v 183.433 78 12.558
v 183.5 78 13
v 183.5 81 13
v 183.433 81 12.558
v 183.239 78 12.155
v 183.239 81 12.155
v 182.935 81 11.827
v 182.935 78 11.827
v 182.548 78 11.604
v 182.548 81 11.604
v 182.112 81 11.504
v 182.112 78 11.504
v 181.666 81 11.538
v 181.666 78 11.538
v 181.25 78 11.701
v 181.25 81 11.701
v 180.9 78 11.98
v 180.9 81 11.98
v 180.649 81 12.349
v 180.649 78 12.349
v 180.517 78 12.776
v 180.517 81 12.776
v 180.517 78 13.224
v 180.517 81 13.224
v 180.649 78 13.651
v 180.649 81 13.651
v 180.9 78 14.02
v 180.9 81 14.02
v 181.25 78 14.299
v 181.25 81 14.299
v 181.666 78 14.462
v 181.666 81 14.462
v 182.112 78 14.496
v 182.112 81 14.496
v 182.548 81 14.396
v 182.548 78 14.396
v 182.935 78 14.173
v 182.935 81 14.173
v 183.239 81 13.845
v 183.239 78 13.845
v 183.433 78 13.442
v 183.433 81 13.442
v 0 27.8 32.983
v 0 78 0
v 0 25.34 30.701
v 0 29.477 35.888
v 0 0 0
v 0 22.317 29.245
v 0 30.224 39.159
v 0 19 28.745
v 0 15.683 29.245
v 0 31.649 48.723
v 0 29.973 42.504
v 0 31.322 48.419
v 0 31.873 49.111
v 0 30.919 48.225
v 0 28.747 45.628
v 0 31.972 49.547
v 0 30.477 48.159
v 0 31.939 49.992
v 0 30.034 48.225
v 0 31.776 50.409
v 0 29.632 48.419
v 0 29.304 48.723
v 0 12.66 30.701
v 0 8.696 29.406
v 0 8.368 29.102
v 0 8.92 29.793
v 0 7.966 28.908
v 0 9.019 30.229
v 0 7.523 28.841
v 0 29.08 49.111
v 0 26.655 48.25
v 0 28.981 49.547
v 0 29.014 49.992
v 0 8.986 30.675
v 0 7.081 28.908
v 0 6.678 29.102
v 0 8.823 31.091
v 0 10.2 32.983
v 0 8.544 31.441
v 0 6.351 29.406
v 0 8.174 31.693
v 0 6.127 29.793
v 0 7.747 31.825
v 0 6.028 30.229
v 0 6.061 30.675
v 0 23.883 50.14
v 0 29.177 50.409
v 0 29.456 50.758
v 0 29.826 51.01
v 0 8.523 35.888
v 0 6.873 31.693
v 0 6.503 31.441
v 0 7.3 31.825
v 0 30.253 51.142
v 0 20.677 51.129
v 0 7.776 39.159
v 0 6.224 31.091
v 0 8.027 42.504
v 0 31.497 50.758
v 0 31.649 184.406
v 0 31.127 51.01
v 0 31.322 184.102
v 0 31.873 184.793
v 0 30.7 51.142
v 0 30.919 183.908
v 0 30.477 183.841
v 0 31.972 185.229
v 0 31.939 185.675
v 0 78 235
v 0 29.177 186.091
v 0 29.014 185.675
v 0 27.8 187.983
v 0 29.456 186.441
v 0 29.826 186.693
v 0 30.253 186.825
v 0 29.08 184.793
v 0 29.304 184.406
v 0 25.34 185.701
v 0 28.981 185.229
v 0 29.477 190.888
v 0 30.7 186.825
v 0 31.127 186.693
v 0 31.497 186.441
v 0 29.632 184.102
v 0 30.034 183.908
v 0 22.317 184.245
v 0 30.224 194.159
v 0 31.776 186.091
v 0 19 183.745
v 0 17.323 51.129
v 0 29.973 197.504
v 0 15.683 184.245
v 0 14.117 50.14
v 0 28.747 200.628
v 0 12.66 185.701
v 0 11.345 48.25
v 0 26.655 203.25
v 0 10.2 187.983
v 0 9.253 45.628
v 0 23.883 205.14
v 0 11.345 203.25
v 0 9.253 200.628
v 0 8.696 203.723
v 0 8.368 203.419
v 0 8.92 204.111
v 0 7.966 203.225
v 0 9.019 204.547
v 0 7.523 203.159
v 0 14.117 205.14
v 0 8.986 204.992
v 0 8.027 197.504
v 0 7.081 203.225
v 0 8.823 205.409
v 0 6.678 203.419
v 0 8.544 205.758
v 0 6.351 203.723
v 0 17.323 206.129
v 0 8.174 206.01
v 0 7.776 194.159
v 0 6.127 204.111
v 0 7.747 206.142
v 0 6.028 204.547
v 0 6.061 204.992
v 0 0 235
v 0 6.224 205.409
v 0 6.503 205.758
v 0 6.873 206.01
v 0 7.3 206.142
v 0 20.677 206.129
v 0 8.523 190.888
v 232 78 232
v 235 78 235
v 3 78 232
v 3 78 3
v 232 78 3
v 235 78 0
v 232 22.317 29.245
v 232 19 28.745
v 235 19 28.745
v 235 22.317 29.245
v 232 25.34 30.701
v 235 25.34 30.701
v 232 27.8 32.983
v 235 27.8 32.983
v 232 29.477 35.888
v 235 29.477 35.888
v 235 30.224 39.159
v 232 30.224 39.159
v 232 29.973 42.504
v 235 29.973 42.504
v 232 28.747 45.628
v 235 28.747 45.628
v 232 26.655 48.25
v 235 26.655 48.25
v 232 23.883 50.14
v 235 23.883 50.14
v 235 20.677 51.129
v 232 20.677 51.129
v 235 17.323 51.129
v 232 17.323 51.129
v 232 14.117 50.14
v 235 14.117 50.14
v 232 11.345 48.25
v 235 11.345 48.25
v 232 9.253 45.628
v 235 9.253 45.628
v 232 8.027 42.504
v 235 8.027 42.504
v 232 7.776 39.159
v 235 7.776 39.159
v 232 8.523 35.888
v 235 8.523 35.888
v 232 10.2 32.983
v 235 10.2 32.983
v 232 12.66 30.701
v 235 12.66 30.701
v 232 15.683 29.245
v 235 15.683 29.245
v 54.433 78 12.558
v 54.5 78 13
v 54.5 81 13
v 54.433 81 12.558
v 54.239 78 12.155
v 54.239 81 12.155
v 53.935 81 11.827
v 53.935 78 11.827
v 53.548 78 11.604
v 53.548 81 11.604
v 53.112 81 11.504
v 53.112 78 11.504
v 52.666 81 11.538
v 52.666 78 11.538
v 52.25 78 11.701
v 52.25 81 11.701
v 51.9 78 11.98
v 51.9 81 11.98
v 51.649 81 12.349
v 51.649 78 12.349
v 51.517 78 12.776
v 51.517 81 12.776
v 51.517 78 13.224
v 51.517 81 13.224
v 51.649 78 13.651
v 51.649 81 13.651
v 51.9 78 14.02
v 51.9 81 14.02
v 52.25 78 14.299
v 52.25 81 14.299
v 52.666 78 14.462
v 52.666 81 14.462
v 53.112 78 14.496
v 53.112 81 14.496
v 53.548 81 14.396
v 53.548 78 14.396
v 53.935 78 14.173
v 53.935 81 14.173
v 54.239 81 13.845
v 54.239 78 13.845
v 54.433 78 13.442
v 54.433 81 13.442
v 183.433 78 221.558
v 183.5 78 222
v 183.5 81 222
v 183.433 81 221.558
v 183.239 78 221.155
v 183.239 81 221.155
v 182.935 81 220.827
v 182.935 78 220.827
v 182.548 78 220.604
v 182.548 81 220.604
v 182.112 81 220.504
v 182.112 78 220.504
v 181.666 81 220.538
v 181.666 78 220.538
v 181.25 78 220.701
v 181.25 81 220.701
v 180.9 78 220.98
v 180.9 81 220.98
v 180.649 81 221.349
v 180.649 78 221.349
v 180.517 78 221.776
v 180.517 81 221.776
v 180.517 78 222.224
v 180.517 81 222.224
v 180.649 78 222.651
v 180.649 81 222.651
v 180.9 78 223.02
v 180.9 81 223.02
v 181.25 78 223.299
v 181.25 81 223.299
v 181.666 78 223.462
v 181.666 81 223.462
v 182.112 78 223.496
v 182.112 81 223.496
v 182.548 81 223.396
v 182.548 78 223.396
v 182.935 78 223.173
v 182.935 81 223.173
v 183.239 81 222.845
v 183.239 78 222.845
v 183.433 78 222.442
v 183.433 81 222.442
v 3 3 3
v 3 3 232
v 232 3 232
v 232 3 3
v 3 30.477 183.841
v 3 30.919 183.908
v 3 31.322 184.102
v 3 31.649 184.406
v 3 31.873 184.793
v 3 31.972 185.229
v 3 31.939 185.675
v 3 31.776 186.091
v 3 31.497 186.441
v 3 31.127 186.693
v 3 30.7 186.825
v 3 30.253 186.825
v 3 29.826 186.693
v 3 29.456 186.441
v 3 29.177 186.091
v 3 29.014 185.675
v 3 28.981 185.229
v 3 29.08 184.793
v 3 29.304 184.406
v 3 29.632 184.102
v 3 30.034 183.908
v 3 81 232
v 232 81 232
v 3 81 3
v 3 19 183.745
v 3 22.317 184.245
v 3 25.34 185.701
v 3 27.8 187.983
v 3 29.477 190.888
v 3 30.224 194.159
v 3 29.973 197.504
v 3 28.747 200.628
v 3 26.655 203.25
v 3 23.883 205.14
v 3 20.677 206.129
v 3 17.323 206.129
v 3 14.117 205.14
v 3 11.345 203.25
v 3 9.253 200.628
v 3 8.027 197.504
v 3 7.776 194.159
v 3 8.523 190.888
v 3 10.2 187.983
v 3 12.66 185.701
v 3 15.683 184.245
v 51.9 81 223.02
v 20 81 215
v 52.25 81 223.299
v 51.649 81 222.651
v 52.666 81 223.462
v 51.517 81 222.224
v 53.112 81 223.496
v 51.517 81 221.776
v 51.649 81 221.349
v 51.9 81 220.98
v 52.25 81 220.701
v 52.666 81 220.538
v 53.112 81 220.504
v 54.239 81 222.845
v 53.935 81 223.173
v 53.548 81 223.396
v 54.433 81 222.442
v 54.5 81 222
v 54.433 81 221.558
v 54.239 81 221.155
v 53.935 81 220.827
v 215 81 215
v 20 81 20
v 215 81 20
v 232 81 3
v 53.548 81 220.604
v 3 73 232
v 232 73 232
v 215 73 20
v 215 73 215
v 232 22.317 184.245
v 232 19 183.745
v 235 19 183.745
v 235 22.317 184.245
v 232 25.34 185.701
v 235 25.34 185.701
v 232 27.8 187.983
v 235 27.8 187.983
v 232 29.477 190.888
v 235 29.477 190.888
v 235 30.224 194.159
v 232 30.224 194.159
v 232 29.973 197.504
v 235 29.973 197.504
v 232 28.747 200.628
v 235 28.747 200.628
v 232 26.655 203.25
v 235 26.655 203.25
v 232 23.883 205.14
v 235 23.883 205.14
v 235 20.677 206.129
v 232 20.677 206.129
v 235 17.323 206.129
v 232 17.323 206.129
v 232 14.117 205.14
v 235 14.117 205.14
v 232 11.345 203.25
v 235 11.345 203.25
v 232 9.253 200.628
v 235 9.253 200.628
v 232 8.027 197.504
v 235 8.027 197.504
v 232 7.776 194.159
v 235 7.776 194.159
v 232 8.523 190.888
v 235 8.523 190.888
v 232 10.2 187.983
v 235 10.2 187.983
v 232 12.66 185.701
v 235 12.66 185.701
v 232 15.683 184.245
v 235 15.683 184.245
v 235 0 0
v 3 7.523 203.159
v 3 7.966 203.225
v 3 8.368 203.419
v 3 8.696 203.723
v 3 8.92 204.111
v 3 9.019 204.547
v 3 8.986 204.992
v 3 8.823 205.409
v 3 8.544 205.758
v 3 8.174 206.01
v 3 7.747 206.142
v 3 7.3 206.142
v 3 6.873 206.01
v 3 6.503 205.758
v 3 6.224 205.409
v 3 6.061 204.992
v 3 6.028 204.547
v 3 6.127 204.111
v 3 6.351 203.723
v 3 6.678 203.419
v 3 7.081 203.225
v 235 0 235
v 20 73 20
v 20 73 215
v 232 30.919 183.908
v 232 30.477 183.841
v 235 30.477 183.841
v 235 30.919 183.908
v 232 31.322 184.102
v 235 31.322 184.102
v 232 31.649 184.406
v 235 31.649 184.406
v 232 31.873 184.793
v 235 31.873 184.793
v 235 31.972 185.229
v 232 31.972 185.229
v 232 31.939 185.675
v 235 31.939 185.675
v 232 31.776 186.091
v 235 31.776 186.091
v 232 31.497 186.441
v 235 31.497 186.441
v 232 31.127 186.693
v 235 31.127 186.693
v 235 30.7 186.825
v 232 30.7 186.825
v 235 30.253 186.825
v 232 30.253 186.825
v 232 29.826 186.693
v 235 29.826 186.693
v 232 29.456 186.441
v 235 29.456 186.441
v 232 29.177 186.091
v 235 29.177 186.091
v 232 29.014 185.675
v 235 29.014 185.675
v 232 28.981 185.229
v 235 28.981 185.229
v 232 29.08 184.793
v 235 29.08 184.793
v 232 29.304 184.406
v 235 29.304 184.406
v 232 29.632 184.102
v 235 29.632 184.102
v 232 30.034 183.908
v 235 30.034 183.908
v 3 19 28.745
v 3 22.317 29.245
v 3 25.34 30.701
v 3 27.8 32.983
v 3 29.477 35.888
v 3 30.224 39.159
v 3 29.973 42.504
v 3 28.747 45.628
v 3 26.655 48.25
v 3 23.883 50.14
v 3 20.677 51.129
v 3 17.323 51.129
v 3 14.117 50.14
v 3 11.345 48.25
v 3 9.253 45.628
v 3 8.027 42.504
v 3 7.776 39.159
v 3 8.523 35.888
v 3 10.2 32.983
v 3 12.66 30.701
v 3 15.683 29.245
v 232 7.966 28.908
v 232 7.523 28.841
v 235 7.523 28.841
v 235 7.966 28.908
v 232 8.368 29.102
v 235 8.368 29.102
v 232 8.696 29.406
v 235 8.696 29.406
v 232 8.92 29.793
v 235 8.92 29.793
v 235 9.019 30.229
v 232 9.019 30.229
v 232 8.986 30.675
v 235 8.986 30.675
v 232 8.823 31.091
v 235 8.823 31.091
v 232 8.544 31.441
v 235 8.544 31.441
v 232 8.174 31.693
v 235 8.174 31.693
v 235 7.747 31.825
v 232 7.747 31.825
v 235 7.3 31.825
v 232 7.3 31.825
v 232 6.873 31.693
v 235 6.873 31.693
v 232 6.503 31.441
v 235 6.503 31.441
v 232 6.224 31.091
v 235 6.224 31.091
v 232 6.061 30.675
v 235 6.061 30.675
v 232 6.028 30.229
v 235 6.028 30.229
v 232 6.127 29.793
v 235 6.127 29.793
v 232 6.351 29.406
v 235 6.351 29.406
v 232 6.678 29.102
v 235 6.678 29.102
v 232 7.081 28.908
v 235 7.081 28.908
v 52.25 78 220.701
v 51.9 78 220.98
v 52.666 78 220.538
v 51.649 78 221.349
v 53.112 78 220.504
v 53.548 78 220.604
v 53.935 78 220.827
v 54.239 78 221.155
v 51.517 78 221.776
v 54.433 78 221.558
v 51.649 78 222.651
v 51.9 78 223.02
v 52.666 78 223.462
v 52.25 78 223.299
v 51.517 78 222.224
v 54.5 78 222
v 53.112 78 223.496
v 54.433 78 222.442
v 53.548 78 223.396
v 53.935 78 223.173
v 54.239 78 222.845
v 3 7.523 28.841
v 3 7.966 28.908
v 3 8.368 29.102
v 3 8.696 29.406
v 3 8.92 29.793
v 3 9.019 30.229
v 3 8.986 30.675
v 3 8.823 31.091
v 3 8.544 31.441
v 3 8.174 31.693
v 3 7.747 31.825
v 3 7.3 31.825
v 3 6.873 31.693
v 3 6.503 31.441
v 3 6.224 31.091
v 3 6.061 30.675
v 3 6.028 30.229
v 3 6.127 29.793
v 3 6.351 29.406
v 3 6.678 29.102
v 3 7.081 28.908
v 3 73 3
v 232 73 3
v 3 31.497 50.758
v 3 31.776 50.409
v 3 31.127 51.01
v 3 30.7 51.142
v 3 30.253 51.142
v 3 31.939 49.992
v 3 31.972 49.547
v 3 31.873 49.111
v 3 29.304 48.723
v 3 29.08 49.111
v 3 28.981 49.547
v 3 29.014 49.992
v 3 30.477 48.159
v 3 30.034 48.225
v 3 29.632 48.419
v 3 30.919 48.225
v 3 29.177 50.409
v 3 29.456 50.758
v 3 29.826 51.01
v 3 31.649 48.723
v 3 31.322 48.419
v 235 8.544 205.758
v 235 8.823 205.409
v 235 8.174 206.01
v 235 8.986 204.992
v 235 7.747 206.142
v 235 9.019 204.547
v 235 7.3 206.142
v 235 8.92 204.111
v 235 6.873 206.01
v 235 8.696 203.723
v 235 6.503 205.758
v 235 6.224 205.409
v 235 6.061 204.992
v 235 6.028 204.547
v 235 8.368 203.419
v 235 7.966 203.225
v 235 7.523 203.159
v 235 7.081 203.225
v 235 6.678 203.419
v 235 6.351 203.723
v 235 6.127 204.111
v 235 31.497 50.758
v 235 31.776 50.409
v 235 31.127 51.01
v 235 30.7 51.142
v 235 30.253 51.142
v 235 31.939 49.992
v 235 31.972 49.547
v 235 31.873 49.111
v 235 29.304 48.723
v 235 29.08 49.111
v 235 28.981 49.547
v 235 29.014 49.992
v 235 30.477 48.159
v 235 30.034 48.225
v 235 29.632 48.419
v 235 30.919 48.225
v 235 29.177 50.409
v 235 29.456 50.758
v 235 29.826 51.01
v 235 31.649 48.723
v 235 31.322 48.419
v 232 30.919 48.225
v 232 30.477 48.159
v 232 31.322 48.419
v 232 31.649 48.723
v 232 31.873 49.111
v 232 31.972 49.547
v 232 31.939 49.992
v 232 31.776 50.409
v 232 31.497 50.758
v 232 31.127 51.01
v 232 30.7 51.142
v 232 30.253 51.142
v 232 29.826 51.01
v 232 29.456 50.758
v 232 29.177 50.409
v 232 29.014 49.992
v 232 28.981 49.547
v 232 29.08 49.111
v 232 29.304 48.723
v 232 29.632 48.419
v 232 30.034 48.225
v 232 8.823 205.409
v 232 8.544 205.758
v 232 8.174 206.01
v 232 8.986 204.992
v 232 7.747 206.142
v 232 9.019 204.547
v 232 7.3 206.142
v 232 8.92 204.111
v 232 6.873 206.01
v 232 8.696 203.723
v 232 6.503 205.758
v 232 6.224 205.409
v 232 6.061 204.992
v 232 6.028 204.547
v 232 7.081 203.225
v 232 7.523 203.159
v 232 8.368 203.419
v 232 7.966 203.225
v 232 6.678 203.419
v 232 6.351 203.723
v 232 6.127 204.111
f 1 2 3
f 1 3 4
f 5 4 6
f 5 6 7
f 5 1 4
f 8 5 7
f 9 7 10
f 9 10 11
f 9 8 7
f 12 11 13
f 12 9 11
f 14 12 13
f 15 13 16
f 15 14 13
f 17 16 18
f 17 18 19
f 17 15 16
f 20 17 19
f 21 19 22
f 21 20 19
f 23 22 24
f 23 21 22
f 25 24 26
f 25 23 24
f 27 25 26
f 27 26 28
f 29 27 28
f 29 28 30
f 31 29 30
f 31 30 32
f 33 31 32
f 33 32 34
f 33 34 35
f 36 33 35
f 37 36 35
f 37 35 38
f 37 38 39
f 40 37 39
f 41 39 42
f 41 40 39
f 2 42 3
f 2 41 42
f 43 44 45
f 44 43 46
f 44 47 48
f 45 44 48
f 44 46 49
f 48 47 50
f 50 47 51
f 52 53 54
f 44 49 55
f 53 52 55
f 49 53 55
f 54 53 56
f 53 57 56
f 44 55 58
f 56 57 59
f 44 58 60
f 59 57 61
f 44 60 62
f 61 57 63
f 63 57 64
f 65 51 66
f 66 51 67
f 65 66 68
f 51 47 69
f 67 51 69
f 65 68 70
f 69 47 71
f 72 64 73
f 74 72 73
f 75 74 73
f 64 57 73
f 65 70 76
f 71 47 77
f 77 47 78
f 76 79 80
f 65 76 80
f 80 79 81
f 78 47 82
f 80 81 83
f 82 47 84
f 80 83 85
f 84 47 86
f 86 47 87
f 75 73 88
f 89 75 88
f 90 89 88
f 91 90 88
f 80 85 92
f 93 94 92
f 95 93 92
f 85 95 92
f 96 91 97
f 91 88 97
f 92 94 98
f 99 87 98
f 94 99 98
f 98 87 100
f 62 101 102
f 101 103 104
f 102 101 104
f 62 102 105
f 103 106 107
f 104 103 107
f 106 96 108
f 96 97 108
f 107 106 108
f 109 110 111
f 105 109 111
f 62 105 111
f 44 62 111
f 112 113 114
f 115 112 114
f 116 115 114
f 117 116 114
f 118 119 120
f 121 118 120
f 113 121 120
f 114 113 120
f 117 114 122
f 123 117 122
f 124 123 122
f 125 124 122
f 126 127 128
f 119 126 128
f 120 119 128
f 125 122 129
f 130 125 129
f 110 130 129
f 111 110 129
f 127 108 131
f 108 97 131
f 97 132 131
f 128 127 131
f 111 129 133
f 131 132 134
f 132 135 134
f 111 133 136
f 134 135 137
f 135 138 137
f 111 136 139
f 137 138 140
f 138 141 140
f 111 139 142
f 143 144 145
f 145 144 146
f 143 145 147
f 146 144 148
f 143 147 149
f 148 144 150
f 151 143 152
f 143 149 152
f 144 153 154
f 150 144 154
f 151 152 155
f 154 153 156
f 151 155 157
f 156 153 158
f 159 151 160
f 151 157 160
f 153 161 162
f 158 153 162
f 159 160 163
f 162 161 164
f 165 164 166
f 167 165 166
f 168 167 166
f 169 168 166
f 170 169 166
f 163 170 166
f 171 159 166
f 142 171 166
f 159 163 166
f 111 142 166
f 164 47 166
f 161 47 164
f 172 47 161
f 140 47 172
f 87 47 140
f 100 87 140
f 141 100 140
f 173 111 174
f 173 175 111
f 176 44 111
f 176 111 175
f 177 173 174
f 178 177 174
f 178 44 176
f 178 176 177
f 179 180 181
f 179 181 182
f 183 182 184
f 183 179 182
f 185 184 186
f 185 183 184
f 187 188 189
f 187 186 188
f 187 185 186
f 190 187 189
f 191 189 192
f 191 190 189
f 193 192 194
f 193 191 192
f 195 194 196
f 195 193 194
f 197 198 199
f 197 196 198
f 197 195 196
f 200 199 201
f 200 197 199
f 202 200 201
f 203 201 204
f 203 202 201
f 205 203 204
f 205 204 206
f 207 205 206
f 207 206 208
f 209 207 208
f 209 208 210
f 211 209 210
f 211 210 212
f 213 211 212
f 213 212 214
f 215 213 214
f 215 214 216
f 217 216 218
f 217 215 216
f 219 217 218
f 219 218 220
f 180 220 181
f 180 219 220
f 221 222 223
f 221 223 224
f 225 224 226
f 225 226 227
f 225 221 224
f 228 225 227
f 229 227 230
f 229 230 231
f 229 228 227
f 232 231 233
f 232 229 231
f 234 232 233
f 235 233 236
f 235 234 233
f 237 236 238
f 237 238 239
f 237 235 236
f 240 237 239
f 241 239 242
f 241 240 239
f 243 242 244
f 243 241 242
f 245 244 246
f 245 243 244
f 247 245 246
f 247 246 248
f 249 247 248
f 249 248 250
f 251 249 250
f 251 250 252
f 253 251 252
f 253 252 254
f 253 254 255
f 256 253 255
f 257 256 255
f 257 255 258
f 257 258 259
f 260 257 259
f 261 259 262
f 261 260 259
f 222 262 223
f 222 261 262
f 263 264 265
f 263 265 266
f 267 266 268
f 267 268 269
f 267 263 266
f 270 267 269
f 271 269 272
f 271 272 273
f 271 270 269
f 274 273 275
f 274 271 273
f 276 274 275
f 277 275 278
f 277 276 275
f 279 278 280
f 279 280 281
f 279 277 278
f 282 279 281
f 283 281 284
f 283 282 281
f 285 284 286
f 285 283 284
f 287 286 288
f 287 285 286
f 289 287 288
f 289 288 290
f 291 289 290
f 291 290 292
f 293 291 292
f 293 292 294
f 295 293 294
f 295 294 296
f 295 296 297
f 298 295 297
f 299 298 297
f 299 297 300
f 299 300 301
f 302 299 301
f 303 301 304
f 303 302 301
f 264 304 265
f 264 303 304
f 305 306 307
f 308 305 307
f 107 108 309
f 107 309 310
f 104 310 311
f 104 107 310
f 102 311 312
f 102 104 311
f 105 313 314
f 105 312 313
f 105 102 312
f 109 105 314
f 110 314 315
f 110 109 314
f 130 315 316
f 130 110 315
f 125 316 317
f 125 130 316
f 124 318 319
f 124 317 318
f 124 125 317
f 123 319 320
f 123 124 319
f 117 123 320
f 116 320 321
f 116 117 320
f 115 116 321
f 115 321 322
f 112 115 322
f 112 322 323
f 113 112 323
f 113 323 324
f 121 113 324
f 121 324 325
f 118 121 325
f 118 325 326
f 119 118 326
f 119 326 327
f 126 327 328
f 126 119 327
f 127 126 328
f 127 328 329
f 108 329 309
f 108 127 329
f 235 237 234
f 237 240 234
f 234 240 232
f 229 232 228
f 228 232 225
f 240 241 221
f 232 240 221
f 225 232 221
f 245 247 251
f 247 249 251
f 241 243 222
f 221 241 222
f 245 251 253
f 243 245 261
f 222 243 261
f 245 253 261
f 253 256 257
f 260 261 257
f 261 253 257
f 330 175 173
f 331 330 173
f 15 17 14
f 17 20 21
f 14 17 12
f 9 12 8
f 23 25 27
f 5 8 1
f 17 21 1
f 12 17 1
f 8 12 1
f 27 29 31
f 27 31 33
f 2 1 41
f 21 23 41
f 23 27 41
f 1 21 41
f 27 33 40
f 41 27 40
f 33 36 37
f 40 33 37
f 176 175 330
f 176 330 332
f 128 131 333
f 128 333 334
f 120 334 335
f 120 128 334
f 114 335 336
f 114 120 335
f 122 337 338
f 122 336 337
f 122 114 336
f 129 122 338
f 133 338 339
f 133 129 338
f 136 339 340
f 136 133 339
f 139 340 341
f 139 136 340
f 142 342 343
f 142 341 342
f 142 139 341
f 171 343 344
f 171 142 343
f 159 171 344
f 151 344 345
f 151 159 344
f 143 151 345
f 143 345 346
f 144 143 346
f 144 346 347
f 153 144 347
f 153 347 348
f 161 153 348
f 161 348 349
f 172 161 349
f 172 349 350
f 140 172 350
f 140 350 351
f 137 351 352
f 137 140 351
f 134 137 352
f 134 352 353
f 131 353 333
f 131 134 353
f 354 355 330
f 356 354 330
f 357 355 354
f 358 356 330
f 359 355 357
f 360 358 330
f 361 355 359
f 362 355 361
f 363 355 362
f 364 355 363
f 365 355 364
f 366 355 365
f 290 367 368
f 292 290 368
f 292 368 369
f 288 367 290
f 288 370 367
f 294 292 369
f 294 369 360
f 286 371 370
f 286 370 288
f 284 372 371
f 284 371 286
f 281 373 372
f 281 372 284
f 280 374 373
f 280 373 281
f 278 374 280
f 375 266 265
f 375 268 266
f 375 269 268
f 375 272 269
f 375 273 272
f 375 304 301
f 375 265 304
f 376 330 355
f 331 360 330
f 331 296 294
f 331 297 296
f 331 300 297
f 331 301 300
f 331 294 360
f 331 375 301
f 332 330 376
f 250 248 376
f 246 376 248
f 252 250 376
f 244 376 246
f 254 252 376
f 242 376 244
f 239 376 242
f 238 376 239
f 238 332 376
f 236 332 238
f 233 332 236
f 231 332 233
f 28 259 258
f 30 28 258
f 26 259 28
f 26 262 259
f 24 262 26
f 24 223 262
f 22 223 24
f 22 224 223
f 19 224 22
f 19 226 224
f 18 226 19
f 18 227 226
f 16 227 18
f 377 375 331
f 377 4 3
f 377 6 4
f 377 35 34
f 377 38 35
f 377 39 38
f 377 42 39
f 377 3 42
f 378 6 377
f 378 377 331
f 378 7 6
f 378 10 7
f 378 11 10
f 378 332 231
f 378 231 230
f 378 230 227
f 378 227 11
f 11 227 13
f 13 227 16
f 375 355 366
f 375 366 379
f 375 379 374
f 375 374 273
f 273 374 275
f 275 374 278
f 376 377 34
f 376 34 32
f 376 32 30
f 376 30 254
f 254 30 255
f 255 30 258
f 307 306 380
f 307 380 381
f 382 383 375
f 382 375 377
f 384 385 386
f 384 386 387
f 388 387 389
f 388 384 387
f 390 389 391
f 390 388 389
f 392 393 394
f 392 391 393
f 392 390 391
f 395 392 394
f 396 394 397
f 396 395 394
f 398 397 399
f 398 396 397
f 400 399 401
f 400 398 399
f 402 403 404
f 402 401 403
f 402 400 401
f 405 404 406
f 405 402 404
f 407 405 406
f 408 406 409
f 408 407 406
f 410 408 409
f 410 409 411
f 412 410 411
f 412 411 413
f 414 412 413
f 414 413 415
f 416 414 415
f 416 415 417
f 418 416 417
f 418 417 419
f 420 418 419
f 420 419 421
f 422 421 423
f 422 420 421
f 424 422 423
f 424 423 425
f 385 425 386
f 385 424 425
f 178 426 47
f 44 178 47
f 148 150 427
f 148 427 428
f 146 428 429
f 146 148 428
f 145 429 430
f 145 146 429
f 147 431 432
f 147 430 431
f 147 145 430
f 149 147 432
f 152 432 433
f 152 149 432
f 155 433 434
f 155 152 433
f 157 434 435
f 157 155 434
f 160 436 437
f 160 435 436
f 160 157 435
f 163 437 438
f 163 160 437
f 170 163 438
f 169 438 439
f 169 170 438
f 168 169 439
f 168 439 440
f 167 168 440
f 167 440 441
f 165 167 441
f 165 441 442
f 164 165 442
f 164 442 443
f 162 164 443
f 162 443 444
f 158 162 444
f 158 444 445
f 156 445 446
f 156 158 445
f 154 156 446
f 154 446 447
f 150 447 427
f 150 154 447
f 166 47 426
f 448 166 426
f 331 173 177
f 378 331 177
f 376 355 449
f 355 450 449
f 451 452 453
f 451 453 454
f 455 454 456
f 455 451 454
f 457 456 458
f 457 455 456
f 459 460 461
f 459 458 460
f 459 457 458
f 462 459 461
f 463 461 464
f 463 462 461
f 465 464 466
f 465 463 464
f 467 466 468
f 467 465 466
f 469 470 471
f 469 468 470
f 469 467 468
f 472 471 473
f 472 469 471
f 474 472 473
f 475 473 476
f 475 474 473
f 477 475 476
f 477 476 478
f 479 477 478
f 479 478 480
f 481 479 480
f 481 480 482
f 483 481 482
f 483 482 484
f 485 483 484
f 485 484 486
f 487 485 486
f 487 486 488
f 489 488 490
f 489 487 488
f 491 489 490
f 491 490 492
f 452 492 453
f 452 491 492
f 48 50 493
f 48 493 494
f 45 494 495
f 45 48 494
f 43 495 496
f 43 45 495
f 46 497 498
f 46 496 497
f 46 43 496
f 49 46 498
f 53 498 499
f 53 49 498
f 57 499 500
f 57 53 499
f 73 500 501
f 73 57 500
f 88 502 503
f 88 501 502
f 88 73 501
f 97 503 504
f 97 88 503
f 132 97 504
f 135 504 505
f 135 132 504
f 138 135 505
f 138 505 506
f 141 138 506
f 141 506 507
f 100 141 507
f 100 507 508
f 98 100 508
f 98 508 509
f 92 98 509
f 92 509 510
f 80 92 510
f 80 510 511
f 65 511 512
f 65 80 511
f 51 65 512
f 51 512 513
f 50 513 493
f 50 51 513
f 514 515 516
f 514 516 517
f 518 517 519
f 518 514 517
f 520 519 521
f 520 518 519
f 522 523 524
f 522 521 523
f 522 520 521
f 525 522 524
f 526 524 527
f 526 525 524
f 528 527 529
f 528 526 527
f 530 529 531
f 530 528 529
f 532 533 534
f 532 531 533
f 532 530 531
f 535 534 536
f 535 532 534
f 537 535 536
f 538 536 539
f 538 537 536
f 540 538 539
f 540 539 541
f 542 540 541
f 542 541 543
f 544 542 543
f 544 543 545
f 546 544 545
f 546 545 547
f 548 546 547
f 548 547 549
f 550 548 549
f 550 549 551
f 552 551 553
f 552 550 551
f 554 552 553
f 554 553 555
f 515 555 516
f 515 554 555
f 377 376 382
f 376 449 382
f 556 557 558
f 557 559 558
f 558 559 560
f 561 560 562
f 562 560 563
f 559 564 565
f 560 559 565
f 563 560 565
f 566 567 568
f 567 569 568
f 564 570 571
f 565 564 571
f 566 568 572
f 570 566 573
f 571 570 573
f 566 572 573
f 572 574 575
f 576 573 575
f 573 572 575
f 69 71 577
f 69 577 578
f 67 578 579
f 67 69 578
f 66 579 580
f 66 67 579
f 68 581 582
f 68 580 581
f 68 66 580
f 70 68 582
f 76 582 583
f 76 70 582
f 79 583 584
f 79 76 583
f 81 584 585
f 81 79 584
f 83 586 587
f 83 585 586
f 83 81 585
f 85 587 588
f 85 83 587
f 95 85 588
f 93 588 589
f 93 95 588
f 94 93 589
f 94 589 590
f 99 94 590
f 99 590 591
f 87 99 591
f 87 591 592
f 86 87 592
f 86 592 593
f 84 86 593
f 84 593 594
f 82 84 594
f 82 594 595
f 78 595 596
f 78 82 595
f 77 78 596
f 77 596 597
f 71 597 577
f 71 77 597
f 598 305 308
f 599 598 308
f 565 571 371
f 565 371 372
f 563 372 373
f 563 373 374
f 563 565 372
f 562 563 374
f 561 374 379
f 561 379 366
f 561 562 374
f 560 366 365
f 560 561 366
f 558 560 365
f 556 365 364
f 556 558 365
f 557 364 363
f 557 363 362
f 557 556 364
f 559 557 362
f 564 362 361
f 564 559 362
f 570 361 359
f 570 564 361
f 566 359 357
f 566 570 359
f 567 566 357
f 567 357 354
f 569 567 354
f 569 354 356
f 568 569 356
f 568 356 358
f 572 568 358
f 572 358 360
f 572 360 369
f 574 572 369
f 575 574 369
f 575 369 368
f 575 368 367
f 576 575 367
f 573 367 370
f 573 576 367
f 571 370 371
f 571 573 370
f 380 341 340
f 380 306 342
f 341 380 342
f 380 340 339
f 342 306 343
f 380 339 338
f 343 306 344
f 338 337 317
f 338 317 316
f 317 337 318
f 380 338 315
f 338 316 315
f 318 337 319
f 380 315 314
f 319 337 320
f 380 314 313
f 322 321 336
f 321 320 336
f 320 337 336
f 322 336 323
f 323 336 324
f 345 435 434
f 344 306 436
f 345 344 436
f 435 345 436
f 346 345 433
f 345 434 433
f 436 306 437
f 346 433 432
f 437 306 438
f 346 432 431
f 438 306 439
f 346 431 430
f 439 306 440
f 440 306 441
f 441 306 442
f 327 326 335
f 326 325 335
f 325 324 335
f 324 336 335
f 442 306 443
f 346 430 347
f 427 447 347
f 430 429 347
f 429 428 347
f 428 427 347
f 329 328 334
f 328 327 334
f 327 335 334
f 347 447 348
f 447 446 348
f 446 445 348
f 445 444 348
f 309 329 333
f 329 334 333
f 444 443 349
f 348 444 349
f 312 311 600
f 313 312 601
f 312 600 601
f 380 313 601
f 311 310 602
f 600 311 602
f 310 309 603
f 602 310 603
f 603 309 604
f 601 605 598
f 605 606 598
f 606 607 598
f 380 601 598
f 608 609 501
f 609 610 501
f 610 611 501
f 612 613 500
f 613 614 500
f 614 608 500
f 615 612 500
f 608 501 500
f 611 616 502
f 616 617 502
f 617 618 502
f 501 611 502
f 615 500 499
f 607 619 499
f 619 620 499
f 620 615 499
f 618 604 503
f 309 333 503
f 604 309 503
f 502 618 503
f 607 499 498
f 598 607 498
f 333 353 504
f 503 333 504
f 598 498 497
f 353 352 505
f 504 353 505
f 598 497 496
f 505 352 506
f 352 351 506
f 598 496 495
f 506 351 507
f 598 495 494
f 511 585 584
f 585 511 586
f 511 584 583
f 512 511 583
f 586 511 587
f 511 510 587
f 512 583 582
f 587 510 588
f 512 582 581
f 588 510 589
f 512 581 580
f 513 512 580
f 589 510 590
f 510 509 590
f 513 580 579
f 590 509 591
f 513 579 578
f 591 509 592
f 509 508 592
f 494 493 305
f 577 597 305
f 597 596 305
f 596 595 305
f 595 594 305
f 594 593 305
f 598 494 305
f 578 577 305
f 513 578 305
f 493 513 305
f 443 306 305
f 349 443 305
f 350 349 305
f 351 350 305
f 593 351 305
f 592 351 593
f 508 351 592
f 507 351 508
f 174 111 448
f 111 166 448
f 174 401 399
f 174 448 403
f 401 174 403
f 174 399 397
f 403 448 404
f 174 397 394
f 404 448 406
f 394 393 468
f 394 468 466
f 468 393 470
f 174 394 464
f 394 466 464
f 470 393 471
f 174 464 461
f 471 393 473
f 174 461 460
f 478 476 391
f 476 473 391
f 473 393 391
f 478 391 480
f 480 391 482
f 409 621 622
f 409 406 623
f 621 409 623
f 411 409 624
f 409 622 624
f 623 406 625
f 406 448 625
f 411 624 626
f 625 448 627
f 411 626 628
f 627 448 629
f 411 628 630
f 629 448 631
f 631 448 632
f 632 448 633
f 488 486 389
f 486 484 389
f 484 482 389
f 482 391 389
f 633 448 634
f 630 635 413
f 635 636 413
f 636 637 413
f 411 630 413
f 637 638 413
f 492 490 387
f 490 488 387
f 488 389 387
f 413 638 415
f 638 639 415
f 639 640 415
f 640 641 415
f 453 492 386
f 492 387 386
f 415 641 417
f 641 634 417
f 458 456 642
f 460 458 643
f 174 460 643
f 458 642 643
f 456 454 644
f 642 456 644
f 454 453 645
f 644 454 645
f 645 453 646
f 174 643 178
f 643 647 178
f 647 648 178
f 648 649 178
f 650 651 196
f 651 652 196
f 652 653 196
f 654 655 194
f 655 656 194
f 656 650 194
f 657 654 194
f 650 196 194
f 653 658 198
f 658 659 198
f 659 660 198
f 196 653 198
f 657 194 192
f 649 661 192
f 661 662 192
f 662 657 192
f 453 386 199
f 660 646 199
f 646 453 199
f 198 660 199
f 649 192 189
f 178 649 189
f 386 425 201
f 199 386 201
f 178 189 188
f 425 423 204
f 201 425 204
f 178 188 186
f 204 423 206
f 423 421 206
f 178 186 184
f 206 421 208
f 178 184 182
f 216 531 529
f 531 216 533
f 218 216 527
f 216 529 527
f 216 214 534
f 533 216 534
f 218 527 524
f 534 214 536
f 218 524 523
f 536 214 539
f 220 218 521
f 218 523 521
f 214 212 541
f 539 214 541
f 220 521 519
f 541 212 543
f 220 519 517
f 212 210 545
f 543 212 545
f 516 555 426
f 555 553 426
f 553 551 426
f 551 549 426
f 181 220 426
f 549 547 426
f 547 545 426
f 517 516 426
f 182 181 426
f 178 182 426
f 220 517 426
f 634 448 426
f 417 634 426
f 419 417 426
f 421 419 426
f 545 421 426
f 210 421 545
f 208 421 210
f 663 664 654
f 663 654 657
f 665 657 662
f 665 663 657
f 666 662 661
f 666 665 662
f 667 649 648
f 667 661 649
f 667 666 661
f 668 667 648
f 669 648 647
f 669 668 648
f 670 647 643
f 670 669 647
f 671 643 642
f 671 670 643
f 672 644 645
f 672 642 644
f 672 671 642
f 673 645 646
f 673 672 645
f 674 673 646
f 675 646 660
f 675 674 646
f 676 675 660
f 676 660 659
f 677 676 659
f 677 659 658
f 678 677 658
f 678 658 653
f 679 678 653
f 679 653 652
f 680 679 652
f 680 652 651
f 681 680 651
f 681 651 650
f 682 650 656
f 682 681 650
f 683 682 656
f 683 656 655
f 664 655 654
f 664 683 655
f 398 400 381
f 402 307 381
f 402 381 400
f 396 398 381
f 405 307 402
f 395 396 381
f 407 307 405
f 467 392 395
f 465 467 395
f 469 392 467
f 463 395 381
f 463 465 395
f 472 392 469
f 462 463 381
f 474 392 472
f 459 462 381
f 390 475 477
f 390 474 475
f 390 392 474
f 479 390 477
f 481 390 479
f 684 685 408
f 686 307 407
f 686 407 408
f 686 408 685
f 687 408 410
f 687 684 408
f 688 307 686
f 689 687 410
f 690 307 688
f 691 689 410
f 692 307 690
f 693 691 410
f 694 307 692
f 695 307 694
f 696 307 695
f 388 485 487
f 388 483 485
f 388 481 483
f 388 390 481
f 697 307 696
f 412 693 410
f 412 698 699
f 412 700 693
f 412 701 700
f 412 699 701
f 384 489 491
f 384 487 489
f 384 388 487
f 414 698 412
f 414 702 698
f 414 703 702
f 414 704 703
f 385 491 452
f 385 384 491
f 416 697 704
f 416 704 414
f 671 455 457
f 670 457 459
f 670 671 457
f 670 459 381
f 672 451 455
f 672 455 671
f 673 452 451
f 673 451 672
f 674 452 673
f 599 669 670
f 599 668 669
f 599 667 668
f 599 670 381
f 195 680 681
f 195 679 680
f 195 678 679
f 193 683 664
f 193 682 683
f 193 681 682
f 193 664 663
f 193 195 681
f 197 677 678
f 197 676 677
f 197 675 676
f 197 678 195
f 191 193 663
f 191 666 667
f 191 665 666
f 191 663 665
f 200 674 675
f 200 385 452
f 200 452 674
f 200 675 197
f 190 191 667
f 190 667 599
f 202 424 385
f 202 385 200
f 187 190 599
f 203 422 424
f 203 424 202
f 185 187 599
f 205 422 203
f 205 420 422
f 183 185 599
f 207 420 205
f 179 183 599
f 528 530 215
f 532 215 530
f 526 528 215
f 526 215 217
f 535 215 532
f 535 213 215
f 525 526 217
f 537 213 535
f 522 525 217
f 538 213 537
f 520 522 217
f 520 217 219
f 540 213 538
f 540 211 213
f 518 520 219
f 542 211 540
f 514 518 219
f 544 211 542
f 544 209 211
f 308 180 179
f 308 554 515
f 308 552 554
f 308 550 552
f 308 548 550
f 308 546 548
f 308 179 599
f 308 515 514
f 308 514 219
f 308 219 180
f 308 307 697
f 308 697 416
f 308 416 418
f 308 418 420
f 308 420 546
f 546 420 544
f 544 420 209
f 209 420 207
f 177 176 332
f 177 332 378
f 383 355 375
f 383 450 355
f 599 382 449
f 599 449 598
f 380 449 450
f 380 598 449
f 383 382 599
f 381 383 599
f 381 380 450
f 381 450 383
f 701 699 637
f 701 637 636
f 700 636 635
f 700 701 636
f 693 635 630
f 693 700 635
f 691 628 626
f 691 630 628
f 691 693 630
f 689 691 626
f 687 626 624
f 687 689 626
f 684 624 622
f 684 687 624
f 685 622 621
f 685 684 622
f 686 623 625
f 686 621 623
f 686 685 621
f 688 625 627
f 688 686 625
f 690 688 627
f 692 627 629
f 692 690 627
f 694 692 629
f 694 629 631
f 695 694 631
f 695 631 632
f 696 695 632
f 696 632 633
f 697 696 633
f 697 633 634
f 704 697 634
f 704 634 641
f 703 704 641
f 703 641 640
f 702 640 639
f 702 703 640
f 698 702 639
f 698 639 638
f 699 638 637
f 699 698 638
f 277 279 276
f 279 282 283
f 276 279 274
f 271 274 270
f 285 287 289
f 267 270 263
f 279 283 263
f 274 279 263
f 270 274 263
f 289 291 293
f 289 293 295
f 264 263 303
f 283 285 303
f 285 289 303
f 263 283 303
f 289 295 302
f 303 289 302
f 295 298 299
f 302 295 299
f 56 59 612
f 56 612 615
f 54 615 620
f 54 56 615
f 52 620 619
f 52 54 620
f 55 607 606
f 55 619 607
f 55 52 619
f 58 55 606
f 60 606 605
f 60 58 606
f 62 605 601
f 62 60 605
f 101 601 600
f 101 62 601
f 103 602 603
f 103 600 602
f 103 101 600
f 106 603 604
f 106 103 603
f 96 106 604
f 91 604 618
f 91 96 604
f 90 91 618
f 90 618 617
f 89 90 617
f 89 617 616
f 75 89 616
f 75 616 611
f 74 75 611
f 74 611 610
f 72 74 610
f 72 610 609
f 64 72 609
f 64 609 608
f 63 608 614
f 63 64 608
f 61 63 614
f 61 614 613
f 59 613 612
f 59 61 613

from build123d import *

# Parameters (mm, degrees)
SKETCH2_W               = 235
SKETCH2_H               = 235
BOSS_EXTRUDE1_DEPTH     = 3
SKETCH3_W               = 229
SKETCH3_H               = 229
BOSS_EXTRUDE3_DEPTH     = 75
SKETCH6_W               = 229
SKETCH6_H               = 229
SKETCH6_R               = 1.5
SKETCH6_W_2             = 195
SKETCH6_H_2             = 195
BOSS_EXTRUDE4_DEPTH     = 3
CUT_EXTRUDE1_DEPTH      = 600
CUT_EXTRUDE1_DEPTH_BACK = 600
SKETCH9_R               = 11.255
SKETCH9_R_2             = 1.5
SKETCH12_W              = 235
SKETCH12_H              = 235
SKETCH12_W_2            = 195
SKETCH12_H_2            = 195
BOSS_EXTRUDE5_DEPTH     = 5


with BuildPart() as part:
    # Sketch2 → Boss-Extrude1 (new body)
    with BuildSketch(Plane(origin=(0, 0, 0), x_dir=(1, 0, 0), z_dir=(0, 1, 0))):
        with Locations((117.5, -117.5)):
            Rectangle(SKETCH2_W, SKETCH2_H)
    extrude(amount=BOSS_EXTRUDE1_DEPTH)

    # Sketch3 → Boss-Extrude3 (add)
    with BuildSketch(Plane(origin=(0, 3, 0), x_dir=(1, 0, 0), z_dir=(0, 1, 0))):
        Polygon((3, 0), (0, 0), (0, -3), (0, -232), (0, -235), (3, -235), (232, -235), (235, -235), (235, -232), (235, -3), (235, 0), (232, 0), align=None)
        with Locations((117.5, -117.5)):
            Rectangle(SKETCH3_W, SKETCH3_H, mode=Mode.SUBTRACT)
    extrude(amount=BOSS_EXTRUDE3_DEPTH)

    # Sketch9 → Cut-Extrude1 (cut, two sides: drawn at the far end of the back side and taken through both)
    with BuildSketch(Plane(origin=(235, 0, 0), x_dir=(0, 0, -1), z_dir=(1, 0, 0)).offset(-CUT_EXTRUDE1_DEPTH_BACK)):
        with Locations((-195, 19)):
            Circle(SKETCH9_R)
        with Locations((-40, 19)):
            Circle(SKETCH9_R)
        with Locations((-185.341358162, 30.476525513)):
            Circle(SKETCH9_R_2)
        with Locations((-204.658641838, 7.523474487)):
            Circle(SKETCH9_R_2)
        with Locations((-30.341358162, 7.523474487)):
            Circle(SKETCH9_R_2)
        with Locations((-49.658641838, 30.476525513)):
            Circle(SKETCH9_R_2)
    extrude(amount=CUT_EXTRUDE1_DEPTH + CUT_EXTRUDE1_DEPTH_BACK, mode=Mode.SUBTRACT)



with BuildPart() as body_2:
    # Sketch6 → Boss-Extrude4 (new body)
    with BuildSketch(Plane(origin=(0, 78, 0), x_dir=(1, 0, 0), z_dir=(0, 1, 0))):
        with Locations((117.5, -117.5)):
            Rectangle(SKETCH6_W, SKETCH6_H)
        with Locations((53, -222)):
            Circle(SKETCH6_R, mode=Mode.SUBTRACT)
        with Locations((182, -222)):
            Circle(SKETCH6_R, mode=Mode.SUBTRACT)
        with Locations((117.5, -117.5)):
            Rectangle(SKETCH6_W_2, SKETCH6_H_2, mode=Mode.SUBTRACT)
        with Locations((53, -13)):
            Circle(SKETCH6_R, mode=Mode.SUBTRACT)
        with Locations((182, -13)):
            Circle(SKETCH6_R, mode=Mode.SUBTRACT)
    extrude(amount=BOSS_EXTRUDE4_DEPTH)


with BuildPart() as part_1:
    add(part.part)

    add(body_2.part)  # Boss-Extrude5 merges body 2
    # Sketch12 → Boss-Extrude5 (add)
    with BuildSketch(Plane.XZ.offset(-78)):
        with Locations((117.5, 117.5)):
            Rectangle(SKETCH12_W, SKETCH12_H)
        with Locations((117.5, 117.5)):
            Rectangle(SKETCH12_W_2, SKETCH12_H_2, mode=Mode.SUBTRACT)
    extrude(amount=BOSS_EXTRUDE5_DEPTH)


solid = part_1.part
